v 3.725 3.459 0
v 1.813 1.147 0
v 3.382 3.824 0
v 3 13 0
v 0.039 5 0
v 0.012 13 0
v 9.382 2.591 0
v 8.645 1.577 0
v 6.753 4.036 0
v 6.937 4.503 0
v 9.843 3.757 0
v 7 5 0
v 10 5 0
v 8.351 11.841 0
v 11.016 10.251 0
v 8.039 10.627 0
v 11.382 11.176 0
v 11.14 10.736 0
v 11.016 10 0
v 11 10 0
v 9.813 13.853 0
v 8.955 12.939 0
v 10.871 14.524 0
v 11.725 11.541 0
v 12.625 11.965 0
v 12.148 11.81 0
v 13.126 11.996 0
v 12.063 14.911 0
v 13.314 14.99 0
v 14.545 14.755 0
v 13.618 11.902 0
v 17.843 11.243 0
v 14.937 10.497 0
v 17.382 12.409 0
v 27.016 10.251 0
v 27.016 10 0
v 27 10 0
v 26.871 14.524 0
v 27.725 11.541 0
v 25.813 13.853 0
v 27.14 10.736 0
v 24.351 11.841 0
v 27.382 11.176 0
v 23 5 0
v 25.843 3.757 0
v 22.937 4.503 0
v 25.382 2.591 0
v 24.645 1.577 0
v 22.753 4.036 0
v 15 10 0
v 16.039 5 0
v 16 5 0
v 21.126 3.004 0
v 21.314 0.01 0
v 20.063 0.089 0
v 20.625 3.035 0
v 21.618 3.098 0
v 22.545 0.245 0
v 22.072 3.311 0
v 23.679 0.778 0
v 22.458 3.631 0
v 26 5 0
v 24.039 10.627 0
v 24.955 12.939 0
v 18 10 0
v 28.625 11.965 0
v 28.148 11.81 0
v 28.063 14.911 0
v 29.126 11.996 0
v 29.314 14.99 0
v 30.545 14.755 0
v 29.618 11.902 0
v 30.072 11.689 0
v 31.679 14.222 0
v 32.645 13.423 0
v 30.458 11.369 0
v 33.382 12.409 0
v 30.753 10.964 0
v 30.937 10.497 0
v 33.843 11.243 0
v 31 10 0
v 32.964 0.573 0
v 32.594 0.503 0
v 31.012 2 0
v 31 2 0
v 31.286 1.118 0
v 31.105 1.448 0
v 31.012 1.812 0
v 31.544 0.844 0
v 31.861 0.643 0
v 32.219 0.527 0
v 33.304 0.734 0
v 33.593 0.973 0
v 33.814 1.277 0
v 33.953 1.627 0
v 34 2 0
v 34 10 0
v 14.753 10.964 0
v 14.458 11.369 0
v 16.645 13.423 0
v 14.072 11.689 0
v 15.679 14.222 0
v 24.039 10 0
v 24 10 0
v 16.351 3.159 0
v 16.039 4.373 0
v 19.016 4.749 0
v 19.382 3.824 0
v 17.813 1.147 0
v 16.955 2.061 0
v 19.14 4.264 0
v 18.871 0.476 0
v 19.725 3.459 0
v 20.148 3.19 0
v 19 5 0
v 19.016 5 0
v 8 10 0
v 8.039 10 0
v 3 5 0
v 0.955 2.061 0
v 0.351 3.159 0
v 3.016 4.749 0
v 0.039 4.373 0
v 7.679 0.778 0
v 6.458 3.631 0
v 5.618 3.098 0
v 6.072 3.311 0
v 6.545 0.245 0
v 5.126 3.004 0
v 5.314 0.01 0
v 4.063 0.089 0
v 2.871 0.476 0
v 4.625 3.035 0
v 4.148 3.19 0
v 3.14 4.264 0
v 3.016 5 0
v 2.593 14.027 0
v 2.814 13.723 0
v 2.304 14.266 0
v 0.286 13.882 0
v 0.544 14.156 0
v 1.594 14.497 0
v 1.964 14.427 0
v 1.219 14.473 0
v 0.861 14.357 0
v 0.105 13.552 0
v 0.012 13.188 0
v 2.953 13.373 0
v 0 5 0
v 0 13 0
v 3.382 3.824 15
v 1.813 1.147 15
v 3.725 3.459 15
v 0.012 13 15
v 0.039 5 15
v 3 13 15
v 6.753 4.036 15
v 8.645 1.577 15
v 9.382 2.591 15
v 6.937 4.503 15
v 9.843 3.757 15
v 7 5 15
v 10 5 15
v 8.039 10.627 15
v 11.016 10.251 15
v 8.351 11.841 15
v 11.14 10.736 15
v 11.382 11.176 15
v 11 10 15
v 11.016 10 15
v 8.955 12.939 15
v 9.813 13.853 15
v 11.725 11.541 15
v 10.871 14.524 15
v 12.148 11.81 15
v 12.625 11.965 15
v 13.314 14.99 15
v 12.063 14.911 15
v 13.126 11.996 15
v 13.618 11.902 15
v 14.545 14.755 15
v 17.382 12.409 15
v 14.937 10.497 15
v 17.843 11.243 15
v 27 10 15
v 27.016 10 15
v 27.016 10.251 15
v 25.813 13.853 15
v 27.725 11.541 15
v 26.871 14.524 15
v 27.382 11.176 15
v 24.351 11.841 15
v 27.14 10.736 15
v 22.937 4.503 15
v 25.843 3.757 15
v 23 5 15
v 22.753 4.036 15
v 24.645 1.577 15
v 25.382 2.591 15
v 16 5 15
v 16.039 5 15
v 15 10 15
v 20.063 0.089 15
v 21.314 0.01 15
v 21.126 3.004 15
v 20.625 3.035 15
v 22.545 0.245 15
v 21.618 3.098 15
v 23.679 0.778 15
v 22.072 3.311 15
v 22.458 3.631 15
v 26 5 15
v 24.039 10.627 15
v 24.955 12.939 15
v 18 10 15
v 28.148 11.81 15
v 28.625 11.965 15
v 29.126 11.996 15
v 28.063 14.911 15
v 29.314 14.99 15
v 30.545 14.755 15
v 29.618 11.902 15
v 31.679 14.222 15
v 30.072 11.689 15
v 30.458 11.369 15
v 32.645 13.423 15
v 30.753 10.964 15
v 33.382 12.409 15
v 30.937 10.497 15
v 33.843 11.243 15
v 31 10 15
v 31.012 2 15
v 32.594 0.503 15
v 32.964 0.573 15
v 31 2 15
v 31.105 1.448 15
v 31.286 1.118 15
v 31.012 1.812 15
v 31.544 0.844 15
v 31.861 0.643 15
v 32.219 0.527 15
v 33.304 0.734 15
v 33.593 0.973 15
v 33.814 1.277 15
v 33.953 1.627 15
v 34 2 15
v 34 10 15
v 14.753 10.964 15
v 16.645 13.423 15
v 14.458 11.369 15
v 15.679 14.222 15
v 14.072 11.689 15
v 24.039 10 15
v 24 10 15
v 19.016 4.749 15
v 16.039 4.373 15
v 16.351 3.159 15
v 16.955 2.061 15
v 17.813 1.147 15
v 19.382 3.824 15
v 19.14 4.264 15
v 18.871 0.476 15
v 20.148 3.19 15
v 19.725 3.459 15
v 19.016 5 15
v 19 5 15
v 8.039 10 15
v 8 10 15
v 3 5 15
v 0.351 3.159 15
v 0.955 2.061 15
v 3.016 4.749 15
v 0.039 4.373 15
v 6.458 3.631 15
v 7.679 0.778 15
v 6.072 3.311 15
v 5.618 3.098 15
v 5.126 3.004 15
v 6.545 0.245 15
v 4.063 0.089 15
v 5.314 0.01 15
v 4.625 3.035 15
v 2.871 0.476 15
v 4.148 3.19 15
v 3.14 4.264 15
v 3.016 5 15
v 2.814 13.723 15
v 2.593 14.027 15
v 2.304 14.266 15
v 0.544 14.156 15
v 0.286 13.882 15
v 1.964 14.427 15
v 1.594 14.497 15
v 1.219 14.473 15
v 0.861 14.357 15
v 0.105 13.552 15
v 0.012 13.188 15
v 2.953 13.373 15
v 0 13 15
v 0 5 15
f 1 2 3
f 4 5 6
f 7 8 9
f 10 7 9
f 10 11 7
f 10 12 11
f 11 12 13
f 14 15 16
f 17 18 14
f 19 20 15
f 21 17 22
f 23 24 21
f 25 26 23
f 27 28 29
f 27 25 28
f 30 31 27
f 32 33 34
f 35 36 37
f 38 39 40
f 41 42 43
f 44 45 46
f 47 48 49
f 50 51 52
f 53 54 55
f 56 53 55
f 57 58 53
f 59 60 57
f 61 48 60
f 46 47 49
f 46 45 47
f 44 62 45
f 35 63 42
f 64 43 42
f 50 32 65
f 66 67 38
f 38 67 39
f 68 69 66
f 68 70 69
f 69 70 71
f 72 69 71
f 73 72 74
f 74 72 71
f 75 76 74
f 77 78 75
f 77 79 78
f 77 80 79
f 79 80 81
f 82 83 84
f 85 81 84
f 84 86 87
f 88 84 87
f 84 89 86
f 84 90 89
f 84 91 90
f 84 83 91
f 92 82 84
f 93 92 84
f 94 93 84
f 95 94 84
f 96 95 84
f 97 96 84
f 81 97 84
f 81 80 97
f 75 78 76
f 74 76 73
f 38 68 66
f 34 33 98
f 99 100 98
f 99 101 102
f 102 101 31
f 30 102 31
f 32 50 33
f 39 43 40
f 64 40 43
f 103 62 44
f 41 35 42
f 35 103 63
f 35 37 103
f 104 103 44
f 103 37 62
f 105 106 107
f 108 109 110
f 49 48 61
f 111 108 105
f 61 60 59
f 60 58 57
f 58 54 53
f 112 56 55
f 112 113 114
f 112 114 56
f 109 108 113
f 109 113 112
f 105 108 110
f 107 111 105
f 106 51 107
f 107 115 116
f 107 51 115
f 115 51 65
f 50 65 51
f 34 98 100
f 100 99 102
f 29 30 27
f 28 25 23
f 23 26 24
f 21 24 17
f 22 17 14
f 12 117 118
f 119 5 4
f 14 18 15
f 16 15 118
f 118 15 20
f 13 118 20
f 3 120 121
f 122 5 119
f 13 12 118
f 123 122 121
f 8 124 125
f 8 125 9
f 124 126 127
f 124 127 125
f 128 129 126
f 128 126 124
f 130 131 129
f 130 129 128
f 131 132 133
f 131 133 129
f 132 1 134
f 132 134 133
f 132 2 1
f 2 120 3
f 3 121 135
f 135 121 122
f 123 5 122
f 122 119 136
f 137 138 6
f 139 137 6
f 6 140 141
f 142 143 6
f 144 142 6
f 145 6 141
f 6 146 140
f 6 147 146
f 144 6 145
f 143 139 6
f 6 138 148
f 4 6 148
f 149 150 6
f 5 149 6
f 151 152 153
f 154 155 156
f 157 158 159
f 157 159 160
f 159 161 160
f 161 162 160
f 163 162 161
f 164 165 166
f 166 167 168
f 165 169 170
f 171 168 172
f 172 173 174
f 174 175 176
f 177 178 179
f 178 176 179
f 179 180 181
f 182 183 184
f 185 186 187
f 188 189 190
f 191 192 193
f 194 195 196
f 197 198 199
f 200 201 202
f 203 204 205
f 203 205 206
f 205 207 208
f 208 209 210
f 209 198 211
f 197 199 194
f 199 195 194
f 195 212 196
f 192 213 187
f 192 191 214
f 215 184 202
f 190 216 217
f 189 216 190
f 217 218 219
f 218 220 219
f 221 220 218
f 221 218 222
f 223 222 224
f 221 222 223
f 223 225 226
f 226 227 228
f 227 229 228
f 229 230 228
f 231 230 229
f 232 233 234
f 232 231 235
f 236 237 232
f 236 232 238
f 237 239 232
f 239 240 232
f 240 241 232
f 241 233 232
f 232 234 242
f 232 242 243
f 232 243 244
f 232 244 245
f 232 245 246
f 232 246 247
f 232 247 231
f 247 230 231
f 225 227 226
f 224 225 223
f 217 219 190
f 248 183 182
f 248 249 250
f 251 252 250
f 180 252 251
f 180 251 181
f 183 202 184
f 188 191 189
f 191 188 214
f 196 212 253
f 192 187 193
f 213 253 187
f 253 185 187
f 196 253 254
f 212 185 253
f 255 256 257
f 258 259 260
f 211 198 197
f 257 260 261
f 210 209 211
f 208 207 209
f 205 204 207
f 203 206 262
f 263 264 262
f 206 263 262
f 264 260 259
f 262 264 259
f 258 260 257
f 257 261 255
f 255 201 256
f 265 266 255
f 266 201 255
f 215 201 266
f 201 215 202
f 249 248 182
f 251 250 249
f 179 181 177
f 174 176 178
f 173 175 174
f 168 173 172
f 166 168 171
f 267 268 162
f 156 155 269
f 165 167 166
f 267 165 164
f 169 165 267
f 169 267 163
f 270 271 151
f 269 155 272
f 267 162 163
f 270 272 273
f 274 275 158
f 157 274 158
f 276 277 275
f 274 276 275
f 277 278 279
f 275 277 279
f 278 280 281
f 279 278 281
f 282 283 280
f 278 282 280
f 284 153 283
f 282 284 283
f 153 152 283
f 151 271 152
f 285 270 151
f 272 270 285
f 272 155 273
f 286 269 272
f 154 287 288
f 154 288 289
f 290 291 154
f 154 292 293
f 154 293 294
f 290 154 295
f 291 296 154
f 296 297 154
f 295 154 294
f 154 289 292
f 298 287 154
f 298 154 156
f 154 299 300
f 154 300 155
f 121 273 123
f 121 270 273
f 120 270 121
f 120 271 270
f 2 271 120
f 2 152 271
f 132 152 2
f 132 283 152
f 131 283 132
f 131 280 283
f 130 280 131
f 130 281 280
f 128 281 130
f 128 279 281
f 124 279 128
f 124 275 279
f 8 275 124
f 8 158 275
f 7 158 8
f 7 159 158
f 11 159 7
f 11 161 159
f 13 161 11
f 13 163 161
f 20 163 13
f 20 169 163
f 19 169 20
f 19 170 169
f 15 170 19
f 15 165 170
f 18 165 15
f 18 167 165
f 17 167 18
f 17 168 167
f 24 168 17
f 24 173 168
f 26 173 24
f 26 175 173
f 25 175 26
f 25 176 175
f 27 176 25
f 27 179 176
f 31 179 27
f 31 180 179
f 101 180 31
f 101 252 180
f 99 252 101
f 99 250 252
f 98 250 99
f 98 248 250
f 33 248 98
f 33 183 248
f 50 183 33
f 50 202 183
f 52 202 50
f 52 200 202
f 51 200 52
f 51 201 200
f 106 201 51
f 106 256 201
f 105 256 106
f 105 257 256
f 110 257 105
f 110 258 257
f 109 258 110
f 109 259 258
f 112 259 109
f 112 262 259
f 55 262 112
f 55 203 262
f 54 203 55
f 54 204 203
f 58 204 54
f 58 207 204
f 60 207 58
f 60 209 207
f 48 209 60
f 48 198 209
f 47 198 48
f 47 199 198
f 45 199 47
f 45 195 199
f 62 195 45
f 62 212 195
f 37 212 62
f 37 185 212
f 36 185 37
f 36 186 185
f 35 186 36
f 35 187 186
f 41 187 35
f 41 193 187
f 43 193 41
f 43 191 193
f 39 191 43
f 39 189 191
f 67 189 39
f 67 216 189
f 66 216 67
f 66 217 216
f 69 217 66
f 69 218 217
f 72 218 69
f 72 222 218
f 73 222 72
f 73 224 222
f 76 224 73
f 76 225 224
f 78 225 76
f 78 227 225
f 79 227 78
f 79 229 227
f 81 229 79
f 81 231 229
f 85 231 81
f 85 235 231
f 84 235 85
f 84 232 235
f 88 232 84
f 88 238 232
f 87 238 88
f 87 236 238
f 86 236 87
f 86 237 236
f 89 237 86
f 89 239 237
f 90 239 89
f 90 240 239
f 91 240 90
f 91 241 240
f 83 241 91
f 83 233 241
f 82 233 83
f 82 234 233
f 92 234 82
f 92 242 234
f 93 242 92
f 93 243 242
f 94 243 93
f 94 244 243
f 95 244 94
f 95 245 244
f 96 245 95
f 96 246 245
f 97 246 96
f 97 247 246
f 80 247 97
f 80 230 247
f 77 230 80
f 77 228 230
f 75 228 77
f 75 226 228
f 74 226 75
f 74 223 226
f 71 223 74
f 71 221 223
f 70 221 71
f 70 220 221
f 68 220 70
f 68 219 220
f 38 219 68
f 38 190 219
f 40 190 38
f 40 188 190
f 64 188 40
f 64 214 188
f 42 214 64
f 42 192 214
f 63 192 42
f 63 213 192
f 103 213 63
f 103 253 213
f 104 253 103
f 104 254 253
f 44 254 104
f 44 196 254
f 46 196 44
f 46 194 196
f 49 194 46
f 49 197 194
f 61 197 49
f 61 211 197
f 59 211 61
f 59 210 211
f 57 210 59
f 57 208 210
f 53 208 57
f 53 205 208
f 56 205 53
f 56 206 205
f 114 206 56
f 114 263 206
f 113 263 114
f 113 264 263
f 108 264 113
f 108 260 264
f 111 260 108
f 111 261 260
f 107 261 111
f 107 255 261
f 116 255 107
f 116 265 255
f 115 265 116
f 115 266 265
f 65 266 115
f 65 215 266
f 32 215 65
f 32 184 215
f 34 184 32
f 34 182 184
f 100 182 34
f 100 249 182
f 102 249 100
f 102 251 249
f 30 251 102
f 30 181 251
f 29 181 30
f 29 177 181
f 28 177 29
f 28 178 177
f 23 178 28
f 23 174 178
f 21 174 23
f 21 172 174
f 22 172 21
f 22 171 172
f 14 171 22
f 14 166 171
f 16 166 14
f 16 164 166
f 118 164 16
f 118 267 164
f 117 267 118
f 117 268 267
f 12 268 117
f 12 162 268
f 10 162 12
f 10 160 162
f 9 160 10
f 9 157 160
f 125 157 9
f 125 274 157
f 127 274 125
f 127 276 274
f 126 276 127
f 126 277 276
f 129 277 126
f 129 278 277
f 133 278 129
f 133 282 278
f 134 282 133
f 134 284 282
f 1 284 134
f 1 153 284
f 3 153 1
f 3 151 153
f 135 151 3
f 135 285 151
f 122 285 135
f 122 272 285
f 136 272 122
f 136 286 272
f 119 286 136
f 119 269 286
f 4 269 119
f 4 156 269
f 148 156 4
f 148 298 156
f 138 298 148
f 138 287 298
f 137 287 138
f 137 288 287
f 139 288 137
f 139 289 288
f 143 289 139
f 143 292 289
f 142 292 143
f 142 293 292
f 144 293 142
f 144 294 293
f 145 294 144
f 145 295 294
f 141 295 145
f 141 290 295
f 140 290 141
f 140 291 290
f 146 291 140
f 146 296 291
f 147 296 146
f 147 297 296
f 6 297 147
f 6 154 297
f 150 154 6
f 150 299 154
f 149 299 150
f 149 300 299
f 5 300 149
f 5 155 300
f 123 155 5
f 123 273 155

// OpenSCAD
FlatSpring(10, 3, 1, 2, 15, 15, $fn=25);

%cube([FlatSpringLength(10, 3, 1, 2), 1, 15]);

function FlatSpringLength(outer_diameter, wall_thickness, offset_per_loop, loops) = (offset_per_loop*2+(outer_diameter+(outer_diameter - wall_thickness*2)))*loops + (outer_diameter - wall_thickness*2)/2;

module FlatSpring(outer_diameter, wall_thickness, offset_per_loop, loops, width2, height) {
	width = width2 - outer_diameter;
	inner_diameter = outer_diameter - wall_thickness*2;
	per_pair_translate = offset_per_loop*2+(outer_diameter+inner_diameter);
	
	linear_extrude(height) translate([outer_diameter/2, outer_diameter/2]) {
		for (i = [0:loops-1]) {
			translate([per_pair_translate*i,0,0])
			FlatSpringLoopPair(outer_diameter, inner_diameter, wall_thickness, width, offset_per_loop, i == loops-1);
		}
		
		translate([-(wall_thickness+inner_diameter/2), 0, 0]) {
			FlatSpringAcrossEnd(wall_thickness, offset_per_loop, width-0.5, outer_diameter);
		}
		translate([(per_pair_translate*loops)-outer_diameter/2-offset_per_loop, width, 0])  rotate([180,0,0]) {
			FlatSpringAcrossEnd(wall_thickness, offset_per_loop, width-0.5, outer_diameter);
		}
	}
}

module FlatSpringLoopPair(outer_diameter, inner_diameter, wall_thickness, width, offset_per_loop, noend) {
	FlatSpringLoop(outer_diameter, inner_diameter);
	
	translate([inner_diameter/2, 0, 0])
	FlatSpringAcross(wall_thickness, offset_per_loop, width);
	
	translate([offset_per_loop+outer_diameter/2+inner_diameter/2, width, 0]) rotate([180,0,0])
	union() {
		FlatSpringLoop(outer_diameter, inner_diameter);
		if (!noend) {
			translate([inner_diameter/2, 0, 0])
			FlatSpringAcross(wall_thickness, offset_per_loop, width);
		}
	}
}

module FlatSpringAcross(wall_thickness, offset_per_loop, width) {
	polygon([[0,0], [wall_thickness, 0], [wall_thickness+offset_per_loop, width], [offset_per_loop, width]]);
}

module FlatSpringAcrossEnd(wall_thickness, offset_per_loop, width, outer_diameter) {
	FlatSpringAcross(wall_thickness, 0, width+outer_diameter/2-wall_thickness/2);
	translate([wall_thickness/2, width+outer_diameter/2-wall_thickness/2, 0]) circle(d=wall_thickness);
}

module FlatSpringLoop(outer_diameter, inner_diameter) {
	difference() {
		circle(d=outer_diameter);
		union() {
			circle(d=inner_diameter);
			translate([-outer_diameter/2,0,0]) square([outer_diameter, outer_diameter]);
		}
	}
}
